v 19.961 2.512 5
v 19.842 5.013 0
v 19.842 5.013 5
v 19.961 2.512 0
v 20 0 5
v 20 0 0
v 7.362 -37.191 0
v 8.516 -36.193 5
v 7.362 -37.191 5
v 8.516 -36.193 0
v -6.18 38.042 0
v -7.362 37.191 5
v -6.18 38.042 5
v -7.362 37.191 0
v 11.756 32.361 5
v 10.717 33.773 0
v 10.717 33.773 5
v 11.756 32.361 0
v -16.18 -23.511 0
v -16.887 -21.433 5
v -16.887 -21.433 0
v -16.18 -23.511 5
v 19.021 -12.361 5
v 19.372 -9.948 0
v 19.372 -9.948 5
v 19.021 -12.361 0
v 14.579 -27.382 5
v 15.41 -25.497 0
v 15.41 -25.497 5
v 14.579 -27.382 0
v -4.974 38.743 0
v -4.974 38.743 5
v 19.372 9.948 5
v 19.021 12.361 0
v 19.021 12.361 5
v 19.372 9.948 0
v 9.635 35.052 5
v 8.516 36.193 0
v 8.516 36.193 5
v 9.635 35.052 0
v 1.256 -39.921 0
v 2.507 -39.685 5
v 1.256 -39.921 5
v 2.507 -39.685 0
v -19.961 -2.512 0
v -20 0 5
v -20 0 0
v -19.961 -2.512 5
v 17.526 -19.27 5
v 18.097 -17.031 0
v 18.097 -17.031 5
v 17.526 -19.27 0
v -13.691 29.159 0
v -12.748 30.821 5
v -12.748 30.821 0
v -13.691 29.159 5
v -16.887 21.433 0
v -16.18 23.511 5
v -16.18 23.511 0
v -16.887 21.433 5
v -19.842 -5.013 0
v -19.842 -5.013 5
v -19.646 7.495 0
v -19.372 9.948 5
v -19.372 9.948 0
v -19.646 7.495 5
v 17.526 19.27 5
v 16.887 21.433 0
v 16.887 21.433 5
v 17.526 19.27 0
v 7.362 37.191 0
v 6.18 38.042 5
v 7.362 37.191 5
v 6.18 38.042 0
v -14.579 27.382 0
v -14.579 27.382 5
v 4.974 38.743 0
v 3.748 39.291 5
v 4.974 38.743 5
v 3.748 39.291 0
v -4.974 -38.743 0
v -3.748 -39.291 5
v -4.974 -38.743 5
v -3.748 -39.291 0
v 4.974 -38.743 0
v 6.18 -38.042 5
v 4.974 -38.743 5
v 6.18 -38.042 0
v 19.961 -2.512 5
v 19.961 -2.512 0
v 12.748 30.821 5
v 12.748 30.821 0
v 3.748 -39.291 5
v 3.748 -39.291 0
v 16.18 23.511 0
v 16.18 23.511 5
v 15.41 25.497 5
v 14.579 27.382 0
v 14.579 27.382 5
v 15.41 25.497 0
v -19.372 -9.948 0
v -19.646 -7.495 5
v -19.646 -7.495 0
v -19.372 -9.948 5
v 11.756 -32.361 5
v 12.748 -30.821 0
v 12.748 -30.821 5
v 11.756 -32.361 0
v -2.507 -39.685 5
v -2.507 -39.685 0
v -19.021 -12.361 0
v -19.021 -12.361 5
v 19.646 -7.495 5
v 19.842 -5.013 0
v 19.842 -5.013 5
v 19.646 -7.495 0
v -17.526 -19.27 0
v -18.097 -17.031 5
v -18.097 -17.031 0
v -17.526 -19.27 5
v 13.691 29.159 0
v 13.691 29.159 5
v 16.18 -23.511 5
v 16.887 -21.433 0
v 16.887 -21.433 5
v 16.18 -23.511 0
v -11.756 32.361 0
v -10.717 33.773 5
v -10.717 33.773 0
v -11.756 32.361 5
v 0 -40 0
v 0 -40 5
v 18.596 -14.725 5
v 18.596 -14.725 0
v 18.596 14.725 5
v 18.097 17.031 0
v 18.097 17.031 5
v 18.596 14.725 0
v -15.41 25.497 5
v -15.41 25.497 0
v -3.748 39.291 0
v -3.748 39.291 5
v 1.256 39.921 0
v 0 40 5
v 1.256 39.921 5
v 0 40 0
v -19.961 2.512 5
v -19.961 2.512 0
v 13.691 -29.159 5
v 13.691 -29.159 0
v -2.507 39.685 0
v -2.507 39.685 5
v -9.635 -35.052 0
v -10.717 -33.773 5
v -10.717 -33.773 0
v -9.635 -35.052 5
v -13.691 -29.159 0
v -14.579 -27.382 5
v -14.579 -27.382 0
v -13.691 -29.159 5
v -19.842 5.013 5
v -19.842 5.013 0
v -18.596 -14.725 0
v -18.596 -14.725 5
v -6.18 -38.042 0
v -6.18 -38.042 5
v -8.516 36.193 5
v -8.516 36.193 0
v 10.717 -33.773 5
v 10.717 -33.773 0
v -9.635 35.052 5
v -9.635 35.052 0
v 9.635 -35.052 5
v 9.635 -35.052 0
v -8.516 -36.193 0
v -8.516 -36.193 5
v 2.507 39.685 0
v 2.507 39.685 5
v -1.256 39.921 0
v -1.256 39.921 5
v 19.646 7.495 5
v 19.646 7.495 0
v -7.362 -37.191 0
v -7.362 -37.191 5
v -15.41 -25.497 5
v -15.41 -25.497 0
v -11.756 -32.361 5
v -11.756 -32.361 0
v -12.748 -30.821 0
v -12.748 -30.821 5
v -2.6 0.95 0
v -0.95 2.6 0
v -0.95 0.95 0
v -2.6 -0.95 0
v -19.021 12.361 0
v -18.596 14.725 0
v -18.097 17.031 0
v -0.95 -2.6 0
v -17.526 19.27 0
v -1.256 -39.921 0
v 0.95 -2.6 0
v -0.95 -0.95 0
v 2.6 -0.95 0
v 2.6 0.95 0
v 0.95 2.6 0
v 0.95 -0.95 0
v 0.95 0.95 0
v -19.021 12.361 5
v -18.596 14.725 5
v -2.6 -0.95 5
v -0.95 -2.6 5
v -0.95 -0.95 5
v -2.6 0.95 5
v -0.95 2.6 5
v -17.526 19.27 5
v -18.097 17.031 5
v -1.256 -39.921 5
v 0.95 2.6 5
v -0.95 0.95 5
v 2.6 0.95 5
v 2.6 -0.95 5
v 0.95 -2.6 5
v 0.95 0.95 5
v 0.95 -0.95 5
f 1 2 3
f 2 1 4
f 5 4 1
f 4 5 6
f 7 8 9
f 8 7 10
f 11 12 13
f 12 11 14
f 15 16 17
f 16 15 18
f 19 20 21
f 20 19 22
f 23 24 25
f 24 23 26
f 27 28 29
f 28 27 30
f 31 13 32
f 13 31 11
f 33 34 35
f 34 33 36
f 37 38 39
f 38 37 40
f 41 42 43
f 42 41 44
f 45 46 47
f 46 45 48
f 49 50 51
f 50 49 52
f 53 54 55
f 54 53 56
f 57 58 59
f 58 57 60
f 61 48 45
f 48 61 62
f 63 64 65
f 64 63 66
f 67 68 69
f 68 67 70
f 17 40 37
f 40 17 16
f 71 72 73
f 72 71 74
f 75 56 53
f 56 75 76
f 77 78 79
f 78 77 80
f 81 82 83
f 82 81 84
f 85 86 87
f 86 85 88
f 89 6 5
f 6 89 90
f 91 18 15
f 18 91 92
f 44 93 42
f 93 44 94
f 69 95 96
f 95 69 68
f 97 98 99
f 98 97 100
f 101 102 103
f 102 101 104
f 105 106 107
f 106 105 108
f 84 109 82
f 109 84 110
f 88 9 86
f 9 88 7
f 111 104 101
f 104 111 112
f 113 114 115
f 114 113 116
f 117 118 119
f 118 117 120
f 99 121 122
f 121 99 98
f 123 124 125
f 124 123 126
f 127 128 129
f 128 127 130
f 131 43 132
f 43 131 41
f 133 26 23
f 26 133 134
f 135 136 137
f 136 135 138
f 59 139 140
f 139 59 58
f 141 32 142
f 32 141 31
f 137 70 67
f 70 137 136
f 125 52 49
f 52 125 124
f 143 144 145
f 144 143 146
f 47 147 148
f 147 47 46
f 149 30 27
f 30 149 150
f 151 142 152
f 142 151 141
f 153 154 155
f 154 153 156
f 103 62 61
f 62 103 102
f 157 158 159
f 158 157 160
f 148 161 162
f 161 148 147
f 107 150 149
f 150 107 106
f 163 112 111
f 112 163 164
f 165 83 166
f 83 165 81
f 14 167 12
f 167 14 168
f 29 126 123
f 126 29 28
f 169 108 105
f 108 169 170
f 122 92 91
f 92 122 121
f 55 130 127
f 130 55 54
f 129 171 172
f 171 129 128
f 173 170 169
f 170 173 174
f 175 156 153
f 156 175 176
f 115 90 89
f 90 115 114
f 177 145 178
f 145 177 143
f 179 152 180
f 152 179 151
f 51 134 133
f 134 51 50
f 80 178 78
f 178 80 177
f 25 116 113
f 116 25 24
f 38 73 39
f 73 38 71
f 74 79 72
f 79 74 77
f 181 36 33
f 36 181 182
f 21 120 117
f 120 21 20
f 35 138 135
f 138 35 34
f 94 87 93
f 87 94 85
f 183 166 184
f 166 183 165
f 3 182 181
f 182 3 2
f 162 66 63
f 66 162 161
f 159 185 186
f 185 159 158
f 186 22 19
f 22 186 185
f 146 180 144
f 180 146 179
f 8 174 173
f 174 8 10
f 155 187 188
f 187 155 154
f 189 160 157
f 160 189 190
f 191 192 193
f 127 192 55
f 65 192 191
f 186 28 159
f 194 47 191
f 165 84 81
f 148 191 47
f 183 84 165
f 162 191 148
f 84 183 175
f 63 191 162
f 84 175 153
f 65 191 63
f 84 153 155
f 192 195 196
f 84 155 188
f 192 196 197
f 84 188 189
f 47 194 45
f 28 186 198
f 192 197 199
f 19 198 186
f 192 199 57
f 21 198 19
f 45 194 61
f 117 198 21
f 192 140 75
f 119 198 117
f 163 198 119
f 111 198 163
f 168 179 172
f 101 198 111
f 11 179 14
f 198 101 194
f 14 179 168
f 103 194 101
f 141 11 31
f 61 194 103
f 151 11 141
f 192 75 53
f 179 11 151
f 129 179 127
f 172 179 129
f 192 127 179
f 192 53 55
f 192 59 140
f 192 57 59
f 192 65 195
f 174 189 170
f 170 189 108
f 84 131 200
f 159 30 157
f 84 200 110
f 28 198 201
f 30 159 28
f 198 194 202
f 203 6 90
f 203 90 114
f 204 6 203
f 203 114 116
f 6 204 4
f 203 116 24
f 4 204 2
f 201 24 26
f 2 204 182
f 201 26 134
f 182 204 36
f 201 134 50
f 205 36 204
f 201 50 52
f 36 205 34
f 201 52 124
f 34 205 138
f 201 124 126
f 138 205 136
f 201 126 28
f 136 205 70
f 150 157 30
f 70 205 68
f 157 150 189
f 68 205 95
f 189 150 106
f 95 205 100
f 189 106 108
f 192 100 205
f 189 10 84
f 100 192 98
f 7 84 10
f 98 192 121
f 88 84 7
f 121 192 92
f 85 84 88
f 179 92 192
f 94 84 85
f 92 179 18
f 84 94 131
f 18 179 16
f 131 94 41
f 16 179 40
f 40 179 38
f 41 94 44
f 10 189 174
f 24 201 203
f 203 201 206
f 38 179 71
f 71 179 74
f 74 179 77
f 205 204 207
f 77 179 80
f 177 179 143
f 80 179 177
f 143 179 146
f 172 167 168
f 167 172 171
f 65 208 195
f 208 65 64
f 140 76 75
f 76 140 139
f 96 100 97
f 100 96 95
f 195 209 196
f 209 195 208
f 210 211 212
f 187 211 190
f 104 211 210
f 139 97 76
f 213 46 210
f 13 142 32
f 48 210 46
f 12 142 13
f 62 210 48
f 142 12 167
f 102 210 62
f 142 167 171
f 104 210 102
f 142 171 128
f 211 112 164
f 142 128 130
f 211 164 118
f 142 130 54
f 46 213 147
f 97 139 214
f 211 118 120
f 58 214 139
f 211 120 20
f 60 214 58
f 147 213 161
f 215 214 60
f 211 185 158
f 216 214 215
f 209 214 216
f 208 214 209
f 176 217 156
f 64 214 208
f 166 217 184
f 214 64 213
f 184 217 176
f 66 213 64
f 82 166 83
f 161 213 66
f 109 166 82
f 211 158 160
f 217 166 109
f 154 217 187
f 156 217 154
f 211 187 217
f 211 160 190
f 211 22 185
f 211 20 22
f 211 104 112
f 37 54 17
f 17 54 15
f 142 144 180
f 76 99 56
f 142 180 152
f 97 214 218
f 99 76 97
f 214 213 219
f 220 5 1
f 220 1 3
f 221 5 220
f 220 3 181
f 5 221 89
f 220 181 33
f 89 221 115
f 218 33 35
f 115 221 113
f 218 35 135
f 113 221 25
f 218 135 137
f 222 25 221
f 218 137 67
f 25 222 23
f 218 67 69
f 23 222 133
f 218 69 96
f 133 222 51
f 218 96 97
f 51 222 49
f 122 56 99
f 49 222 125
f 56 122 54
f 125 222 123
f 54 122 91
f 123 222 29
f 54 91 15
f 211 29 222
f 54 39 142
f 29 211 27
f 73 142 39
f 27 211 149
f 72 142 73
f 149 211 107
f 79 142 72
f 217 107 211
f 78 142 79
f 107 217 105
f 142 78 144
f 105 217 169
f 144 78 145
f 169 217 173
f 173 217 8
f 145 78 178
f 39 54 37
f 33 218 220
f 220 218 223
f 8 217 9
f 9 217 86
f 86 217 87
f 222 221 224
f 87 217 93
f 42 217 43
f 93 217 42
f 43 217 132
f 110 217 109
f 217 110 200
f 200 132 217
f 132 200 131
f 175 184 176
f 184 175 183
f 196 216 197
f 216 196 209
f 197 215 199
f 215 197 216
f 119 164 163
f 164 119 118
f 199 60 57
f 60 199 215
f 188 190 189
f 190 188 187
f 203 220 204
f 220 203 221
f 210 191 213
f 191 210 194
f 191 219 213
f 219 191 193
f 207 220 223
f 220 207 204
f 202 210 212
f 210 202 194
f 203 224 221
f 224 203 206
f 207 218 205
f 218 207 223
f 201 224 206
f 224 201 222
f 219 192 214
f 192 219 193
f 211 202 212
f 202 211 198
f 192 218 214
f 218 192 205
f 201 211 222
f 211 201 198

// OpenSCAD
difference(){
scale([1.0, 2.0, 1.0]){
cylinder(h=5, r=20, $fn=100);
}
    // cut the center hole
    cube([5.2,1.9,10],center=true);
    cube([1.9,5.2,10],center=true);
}
